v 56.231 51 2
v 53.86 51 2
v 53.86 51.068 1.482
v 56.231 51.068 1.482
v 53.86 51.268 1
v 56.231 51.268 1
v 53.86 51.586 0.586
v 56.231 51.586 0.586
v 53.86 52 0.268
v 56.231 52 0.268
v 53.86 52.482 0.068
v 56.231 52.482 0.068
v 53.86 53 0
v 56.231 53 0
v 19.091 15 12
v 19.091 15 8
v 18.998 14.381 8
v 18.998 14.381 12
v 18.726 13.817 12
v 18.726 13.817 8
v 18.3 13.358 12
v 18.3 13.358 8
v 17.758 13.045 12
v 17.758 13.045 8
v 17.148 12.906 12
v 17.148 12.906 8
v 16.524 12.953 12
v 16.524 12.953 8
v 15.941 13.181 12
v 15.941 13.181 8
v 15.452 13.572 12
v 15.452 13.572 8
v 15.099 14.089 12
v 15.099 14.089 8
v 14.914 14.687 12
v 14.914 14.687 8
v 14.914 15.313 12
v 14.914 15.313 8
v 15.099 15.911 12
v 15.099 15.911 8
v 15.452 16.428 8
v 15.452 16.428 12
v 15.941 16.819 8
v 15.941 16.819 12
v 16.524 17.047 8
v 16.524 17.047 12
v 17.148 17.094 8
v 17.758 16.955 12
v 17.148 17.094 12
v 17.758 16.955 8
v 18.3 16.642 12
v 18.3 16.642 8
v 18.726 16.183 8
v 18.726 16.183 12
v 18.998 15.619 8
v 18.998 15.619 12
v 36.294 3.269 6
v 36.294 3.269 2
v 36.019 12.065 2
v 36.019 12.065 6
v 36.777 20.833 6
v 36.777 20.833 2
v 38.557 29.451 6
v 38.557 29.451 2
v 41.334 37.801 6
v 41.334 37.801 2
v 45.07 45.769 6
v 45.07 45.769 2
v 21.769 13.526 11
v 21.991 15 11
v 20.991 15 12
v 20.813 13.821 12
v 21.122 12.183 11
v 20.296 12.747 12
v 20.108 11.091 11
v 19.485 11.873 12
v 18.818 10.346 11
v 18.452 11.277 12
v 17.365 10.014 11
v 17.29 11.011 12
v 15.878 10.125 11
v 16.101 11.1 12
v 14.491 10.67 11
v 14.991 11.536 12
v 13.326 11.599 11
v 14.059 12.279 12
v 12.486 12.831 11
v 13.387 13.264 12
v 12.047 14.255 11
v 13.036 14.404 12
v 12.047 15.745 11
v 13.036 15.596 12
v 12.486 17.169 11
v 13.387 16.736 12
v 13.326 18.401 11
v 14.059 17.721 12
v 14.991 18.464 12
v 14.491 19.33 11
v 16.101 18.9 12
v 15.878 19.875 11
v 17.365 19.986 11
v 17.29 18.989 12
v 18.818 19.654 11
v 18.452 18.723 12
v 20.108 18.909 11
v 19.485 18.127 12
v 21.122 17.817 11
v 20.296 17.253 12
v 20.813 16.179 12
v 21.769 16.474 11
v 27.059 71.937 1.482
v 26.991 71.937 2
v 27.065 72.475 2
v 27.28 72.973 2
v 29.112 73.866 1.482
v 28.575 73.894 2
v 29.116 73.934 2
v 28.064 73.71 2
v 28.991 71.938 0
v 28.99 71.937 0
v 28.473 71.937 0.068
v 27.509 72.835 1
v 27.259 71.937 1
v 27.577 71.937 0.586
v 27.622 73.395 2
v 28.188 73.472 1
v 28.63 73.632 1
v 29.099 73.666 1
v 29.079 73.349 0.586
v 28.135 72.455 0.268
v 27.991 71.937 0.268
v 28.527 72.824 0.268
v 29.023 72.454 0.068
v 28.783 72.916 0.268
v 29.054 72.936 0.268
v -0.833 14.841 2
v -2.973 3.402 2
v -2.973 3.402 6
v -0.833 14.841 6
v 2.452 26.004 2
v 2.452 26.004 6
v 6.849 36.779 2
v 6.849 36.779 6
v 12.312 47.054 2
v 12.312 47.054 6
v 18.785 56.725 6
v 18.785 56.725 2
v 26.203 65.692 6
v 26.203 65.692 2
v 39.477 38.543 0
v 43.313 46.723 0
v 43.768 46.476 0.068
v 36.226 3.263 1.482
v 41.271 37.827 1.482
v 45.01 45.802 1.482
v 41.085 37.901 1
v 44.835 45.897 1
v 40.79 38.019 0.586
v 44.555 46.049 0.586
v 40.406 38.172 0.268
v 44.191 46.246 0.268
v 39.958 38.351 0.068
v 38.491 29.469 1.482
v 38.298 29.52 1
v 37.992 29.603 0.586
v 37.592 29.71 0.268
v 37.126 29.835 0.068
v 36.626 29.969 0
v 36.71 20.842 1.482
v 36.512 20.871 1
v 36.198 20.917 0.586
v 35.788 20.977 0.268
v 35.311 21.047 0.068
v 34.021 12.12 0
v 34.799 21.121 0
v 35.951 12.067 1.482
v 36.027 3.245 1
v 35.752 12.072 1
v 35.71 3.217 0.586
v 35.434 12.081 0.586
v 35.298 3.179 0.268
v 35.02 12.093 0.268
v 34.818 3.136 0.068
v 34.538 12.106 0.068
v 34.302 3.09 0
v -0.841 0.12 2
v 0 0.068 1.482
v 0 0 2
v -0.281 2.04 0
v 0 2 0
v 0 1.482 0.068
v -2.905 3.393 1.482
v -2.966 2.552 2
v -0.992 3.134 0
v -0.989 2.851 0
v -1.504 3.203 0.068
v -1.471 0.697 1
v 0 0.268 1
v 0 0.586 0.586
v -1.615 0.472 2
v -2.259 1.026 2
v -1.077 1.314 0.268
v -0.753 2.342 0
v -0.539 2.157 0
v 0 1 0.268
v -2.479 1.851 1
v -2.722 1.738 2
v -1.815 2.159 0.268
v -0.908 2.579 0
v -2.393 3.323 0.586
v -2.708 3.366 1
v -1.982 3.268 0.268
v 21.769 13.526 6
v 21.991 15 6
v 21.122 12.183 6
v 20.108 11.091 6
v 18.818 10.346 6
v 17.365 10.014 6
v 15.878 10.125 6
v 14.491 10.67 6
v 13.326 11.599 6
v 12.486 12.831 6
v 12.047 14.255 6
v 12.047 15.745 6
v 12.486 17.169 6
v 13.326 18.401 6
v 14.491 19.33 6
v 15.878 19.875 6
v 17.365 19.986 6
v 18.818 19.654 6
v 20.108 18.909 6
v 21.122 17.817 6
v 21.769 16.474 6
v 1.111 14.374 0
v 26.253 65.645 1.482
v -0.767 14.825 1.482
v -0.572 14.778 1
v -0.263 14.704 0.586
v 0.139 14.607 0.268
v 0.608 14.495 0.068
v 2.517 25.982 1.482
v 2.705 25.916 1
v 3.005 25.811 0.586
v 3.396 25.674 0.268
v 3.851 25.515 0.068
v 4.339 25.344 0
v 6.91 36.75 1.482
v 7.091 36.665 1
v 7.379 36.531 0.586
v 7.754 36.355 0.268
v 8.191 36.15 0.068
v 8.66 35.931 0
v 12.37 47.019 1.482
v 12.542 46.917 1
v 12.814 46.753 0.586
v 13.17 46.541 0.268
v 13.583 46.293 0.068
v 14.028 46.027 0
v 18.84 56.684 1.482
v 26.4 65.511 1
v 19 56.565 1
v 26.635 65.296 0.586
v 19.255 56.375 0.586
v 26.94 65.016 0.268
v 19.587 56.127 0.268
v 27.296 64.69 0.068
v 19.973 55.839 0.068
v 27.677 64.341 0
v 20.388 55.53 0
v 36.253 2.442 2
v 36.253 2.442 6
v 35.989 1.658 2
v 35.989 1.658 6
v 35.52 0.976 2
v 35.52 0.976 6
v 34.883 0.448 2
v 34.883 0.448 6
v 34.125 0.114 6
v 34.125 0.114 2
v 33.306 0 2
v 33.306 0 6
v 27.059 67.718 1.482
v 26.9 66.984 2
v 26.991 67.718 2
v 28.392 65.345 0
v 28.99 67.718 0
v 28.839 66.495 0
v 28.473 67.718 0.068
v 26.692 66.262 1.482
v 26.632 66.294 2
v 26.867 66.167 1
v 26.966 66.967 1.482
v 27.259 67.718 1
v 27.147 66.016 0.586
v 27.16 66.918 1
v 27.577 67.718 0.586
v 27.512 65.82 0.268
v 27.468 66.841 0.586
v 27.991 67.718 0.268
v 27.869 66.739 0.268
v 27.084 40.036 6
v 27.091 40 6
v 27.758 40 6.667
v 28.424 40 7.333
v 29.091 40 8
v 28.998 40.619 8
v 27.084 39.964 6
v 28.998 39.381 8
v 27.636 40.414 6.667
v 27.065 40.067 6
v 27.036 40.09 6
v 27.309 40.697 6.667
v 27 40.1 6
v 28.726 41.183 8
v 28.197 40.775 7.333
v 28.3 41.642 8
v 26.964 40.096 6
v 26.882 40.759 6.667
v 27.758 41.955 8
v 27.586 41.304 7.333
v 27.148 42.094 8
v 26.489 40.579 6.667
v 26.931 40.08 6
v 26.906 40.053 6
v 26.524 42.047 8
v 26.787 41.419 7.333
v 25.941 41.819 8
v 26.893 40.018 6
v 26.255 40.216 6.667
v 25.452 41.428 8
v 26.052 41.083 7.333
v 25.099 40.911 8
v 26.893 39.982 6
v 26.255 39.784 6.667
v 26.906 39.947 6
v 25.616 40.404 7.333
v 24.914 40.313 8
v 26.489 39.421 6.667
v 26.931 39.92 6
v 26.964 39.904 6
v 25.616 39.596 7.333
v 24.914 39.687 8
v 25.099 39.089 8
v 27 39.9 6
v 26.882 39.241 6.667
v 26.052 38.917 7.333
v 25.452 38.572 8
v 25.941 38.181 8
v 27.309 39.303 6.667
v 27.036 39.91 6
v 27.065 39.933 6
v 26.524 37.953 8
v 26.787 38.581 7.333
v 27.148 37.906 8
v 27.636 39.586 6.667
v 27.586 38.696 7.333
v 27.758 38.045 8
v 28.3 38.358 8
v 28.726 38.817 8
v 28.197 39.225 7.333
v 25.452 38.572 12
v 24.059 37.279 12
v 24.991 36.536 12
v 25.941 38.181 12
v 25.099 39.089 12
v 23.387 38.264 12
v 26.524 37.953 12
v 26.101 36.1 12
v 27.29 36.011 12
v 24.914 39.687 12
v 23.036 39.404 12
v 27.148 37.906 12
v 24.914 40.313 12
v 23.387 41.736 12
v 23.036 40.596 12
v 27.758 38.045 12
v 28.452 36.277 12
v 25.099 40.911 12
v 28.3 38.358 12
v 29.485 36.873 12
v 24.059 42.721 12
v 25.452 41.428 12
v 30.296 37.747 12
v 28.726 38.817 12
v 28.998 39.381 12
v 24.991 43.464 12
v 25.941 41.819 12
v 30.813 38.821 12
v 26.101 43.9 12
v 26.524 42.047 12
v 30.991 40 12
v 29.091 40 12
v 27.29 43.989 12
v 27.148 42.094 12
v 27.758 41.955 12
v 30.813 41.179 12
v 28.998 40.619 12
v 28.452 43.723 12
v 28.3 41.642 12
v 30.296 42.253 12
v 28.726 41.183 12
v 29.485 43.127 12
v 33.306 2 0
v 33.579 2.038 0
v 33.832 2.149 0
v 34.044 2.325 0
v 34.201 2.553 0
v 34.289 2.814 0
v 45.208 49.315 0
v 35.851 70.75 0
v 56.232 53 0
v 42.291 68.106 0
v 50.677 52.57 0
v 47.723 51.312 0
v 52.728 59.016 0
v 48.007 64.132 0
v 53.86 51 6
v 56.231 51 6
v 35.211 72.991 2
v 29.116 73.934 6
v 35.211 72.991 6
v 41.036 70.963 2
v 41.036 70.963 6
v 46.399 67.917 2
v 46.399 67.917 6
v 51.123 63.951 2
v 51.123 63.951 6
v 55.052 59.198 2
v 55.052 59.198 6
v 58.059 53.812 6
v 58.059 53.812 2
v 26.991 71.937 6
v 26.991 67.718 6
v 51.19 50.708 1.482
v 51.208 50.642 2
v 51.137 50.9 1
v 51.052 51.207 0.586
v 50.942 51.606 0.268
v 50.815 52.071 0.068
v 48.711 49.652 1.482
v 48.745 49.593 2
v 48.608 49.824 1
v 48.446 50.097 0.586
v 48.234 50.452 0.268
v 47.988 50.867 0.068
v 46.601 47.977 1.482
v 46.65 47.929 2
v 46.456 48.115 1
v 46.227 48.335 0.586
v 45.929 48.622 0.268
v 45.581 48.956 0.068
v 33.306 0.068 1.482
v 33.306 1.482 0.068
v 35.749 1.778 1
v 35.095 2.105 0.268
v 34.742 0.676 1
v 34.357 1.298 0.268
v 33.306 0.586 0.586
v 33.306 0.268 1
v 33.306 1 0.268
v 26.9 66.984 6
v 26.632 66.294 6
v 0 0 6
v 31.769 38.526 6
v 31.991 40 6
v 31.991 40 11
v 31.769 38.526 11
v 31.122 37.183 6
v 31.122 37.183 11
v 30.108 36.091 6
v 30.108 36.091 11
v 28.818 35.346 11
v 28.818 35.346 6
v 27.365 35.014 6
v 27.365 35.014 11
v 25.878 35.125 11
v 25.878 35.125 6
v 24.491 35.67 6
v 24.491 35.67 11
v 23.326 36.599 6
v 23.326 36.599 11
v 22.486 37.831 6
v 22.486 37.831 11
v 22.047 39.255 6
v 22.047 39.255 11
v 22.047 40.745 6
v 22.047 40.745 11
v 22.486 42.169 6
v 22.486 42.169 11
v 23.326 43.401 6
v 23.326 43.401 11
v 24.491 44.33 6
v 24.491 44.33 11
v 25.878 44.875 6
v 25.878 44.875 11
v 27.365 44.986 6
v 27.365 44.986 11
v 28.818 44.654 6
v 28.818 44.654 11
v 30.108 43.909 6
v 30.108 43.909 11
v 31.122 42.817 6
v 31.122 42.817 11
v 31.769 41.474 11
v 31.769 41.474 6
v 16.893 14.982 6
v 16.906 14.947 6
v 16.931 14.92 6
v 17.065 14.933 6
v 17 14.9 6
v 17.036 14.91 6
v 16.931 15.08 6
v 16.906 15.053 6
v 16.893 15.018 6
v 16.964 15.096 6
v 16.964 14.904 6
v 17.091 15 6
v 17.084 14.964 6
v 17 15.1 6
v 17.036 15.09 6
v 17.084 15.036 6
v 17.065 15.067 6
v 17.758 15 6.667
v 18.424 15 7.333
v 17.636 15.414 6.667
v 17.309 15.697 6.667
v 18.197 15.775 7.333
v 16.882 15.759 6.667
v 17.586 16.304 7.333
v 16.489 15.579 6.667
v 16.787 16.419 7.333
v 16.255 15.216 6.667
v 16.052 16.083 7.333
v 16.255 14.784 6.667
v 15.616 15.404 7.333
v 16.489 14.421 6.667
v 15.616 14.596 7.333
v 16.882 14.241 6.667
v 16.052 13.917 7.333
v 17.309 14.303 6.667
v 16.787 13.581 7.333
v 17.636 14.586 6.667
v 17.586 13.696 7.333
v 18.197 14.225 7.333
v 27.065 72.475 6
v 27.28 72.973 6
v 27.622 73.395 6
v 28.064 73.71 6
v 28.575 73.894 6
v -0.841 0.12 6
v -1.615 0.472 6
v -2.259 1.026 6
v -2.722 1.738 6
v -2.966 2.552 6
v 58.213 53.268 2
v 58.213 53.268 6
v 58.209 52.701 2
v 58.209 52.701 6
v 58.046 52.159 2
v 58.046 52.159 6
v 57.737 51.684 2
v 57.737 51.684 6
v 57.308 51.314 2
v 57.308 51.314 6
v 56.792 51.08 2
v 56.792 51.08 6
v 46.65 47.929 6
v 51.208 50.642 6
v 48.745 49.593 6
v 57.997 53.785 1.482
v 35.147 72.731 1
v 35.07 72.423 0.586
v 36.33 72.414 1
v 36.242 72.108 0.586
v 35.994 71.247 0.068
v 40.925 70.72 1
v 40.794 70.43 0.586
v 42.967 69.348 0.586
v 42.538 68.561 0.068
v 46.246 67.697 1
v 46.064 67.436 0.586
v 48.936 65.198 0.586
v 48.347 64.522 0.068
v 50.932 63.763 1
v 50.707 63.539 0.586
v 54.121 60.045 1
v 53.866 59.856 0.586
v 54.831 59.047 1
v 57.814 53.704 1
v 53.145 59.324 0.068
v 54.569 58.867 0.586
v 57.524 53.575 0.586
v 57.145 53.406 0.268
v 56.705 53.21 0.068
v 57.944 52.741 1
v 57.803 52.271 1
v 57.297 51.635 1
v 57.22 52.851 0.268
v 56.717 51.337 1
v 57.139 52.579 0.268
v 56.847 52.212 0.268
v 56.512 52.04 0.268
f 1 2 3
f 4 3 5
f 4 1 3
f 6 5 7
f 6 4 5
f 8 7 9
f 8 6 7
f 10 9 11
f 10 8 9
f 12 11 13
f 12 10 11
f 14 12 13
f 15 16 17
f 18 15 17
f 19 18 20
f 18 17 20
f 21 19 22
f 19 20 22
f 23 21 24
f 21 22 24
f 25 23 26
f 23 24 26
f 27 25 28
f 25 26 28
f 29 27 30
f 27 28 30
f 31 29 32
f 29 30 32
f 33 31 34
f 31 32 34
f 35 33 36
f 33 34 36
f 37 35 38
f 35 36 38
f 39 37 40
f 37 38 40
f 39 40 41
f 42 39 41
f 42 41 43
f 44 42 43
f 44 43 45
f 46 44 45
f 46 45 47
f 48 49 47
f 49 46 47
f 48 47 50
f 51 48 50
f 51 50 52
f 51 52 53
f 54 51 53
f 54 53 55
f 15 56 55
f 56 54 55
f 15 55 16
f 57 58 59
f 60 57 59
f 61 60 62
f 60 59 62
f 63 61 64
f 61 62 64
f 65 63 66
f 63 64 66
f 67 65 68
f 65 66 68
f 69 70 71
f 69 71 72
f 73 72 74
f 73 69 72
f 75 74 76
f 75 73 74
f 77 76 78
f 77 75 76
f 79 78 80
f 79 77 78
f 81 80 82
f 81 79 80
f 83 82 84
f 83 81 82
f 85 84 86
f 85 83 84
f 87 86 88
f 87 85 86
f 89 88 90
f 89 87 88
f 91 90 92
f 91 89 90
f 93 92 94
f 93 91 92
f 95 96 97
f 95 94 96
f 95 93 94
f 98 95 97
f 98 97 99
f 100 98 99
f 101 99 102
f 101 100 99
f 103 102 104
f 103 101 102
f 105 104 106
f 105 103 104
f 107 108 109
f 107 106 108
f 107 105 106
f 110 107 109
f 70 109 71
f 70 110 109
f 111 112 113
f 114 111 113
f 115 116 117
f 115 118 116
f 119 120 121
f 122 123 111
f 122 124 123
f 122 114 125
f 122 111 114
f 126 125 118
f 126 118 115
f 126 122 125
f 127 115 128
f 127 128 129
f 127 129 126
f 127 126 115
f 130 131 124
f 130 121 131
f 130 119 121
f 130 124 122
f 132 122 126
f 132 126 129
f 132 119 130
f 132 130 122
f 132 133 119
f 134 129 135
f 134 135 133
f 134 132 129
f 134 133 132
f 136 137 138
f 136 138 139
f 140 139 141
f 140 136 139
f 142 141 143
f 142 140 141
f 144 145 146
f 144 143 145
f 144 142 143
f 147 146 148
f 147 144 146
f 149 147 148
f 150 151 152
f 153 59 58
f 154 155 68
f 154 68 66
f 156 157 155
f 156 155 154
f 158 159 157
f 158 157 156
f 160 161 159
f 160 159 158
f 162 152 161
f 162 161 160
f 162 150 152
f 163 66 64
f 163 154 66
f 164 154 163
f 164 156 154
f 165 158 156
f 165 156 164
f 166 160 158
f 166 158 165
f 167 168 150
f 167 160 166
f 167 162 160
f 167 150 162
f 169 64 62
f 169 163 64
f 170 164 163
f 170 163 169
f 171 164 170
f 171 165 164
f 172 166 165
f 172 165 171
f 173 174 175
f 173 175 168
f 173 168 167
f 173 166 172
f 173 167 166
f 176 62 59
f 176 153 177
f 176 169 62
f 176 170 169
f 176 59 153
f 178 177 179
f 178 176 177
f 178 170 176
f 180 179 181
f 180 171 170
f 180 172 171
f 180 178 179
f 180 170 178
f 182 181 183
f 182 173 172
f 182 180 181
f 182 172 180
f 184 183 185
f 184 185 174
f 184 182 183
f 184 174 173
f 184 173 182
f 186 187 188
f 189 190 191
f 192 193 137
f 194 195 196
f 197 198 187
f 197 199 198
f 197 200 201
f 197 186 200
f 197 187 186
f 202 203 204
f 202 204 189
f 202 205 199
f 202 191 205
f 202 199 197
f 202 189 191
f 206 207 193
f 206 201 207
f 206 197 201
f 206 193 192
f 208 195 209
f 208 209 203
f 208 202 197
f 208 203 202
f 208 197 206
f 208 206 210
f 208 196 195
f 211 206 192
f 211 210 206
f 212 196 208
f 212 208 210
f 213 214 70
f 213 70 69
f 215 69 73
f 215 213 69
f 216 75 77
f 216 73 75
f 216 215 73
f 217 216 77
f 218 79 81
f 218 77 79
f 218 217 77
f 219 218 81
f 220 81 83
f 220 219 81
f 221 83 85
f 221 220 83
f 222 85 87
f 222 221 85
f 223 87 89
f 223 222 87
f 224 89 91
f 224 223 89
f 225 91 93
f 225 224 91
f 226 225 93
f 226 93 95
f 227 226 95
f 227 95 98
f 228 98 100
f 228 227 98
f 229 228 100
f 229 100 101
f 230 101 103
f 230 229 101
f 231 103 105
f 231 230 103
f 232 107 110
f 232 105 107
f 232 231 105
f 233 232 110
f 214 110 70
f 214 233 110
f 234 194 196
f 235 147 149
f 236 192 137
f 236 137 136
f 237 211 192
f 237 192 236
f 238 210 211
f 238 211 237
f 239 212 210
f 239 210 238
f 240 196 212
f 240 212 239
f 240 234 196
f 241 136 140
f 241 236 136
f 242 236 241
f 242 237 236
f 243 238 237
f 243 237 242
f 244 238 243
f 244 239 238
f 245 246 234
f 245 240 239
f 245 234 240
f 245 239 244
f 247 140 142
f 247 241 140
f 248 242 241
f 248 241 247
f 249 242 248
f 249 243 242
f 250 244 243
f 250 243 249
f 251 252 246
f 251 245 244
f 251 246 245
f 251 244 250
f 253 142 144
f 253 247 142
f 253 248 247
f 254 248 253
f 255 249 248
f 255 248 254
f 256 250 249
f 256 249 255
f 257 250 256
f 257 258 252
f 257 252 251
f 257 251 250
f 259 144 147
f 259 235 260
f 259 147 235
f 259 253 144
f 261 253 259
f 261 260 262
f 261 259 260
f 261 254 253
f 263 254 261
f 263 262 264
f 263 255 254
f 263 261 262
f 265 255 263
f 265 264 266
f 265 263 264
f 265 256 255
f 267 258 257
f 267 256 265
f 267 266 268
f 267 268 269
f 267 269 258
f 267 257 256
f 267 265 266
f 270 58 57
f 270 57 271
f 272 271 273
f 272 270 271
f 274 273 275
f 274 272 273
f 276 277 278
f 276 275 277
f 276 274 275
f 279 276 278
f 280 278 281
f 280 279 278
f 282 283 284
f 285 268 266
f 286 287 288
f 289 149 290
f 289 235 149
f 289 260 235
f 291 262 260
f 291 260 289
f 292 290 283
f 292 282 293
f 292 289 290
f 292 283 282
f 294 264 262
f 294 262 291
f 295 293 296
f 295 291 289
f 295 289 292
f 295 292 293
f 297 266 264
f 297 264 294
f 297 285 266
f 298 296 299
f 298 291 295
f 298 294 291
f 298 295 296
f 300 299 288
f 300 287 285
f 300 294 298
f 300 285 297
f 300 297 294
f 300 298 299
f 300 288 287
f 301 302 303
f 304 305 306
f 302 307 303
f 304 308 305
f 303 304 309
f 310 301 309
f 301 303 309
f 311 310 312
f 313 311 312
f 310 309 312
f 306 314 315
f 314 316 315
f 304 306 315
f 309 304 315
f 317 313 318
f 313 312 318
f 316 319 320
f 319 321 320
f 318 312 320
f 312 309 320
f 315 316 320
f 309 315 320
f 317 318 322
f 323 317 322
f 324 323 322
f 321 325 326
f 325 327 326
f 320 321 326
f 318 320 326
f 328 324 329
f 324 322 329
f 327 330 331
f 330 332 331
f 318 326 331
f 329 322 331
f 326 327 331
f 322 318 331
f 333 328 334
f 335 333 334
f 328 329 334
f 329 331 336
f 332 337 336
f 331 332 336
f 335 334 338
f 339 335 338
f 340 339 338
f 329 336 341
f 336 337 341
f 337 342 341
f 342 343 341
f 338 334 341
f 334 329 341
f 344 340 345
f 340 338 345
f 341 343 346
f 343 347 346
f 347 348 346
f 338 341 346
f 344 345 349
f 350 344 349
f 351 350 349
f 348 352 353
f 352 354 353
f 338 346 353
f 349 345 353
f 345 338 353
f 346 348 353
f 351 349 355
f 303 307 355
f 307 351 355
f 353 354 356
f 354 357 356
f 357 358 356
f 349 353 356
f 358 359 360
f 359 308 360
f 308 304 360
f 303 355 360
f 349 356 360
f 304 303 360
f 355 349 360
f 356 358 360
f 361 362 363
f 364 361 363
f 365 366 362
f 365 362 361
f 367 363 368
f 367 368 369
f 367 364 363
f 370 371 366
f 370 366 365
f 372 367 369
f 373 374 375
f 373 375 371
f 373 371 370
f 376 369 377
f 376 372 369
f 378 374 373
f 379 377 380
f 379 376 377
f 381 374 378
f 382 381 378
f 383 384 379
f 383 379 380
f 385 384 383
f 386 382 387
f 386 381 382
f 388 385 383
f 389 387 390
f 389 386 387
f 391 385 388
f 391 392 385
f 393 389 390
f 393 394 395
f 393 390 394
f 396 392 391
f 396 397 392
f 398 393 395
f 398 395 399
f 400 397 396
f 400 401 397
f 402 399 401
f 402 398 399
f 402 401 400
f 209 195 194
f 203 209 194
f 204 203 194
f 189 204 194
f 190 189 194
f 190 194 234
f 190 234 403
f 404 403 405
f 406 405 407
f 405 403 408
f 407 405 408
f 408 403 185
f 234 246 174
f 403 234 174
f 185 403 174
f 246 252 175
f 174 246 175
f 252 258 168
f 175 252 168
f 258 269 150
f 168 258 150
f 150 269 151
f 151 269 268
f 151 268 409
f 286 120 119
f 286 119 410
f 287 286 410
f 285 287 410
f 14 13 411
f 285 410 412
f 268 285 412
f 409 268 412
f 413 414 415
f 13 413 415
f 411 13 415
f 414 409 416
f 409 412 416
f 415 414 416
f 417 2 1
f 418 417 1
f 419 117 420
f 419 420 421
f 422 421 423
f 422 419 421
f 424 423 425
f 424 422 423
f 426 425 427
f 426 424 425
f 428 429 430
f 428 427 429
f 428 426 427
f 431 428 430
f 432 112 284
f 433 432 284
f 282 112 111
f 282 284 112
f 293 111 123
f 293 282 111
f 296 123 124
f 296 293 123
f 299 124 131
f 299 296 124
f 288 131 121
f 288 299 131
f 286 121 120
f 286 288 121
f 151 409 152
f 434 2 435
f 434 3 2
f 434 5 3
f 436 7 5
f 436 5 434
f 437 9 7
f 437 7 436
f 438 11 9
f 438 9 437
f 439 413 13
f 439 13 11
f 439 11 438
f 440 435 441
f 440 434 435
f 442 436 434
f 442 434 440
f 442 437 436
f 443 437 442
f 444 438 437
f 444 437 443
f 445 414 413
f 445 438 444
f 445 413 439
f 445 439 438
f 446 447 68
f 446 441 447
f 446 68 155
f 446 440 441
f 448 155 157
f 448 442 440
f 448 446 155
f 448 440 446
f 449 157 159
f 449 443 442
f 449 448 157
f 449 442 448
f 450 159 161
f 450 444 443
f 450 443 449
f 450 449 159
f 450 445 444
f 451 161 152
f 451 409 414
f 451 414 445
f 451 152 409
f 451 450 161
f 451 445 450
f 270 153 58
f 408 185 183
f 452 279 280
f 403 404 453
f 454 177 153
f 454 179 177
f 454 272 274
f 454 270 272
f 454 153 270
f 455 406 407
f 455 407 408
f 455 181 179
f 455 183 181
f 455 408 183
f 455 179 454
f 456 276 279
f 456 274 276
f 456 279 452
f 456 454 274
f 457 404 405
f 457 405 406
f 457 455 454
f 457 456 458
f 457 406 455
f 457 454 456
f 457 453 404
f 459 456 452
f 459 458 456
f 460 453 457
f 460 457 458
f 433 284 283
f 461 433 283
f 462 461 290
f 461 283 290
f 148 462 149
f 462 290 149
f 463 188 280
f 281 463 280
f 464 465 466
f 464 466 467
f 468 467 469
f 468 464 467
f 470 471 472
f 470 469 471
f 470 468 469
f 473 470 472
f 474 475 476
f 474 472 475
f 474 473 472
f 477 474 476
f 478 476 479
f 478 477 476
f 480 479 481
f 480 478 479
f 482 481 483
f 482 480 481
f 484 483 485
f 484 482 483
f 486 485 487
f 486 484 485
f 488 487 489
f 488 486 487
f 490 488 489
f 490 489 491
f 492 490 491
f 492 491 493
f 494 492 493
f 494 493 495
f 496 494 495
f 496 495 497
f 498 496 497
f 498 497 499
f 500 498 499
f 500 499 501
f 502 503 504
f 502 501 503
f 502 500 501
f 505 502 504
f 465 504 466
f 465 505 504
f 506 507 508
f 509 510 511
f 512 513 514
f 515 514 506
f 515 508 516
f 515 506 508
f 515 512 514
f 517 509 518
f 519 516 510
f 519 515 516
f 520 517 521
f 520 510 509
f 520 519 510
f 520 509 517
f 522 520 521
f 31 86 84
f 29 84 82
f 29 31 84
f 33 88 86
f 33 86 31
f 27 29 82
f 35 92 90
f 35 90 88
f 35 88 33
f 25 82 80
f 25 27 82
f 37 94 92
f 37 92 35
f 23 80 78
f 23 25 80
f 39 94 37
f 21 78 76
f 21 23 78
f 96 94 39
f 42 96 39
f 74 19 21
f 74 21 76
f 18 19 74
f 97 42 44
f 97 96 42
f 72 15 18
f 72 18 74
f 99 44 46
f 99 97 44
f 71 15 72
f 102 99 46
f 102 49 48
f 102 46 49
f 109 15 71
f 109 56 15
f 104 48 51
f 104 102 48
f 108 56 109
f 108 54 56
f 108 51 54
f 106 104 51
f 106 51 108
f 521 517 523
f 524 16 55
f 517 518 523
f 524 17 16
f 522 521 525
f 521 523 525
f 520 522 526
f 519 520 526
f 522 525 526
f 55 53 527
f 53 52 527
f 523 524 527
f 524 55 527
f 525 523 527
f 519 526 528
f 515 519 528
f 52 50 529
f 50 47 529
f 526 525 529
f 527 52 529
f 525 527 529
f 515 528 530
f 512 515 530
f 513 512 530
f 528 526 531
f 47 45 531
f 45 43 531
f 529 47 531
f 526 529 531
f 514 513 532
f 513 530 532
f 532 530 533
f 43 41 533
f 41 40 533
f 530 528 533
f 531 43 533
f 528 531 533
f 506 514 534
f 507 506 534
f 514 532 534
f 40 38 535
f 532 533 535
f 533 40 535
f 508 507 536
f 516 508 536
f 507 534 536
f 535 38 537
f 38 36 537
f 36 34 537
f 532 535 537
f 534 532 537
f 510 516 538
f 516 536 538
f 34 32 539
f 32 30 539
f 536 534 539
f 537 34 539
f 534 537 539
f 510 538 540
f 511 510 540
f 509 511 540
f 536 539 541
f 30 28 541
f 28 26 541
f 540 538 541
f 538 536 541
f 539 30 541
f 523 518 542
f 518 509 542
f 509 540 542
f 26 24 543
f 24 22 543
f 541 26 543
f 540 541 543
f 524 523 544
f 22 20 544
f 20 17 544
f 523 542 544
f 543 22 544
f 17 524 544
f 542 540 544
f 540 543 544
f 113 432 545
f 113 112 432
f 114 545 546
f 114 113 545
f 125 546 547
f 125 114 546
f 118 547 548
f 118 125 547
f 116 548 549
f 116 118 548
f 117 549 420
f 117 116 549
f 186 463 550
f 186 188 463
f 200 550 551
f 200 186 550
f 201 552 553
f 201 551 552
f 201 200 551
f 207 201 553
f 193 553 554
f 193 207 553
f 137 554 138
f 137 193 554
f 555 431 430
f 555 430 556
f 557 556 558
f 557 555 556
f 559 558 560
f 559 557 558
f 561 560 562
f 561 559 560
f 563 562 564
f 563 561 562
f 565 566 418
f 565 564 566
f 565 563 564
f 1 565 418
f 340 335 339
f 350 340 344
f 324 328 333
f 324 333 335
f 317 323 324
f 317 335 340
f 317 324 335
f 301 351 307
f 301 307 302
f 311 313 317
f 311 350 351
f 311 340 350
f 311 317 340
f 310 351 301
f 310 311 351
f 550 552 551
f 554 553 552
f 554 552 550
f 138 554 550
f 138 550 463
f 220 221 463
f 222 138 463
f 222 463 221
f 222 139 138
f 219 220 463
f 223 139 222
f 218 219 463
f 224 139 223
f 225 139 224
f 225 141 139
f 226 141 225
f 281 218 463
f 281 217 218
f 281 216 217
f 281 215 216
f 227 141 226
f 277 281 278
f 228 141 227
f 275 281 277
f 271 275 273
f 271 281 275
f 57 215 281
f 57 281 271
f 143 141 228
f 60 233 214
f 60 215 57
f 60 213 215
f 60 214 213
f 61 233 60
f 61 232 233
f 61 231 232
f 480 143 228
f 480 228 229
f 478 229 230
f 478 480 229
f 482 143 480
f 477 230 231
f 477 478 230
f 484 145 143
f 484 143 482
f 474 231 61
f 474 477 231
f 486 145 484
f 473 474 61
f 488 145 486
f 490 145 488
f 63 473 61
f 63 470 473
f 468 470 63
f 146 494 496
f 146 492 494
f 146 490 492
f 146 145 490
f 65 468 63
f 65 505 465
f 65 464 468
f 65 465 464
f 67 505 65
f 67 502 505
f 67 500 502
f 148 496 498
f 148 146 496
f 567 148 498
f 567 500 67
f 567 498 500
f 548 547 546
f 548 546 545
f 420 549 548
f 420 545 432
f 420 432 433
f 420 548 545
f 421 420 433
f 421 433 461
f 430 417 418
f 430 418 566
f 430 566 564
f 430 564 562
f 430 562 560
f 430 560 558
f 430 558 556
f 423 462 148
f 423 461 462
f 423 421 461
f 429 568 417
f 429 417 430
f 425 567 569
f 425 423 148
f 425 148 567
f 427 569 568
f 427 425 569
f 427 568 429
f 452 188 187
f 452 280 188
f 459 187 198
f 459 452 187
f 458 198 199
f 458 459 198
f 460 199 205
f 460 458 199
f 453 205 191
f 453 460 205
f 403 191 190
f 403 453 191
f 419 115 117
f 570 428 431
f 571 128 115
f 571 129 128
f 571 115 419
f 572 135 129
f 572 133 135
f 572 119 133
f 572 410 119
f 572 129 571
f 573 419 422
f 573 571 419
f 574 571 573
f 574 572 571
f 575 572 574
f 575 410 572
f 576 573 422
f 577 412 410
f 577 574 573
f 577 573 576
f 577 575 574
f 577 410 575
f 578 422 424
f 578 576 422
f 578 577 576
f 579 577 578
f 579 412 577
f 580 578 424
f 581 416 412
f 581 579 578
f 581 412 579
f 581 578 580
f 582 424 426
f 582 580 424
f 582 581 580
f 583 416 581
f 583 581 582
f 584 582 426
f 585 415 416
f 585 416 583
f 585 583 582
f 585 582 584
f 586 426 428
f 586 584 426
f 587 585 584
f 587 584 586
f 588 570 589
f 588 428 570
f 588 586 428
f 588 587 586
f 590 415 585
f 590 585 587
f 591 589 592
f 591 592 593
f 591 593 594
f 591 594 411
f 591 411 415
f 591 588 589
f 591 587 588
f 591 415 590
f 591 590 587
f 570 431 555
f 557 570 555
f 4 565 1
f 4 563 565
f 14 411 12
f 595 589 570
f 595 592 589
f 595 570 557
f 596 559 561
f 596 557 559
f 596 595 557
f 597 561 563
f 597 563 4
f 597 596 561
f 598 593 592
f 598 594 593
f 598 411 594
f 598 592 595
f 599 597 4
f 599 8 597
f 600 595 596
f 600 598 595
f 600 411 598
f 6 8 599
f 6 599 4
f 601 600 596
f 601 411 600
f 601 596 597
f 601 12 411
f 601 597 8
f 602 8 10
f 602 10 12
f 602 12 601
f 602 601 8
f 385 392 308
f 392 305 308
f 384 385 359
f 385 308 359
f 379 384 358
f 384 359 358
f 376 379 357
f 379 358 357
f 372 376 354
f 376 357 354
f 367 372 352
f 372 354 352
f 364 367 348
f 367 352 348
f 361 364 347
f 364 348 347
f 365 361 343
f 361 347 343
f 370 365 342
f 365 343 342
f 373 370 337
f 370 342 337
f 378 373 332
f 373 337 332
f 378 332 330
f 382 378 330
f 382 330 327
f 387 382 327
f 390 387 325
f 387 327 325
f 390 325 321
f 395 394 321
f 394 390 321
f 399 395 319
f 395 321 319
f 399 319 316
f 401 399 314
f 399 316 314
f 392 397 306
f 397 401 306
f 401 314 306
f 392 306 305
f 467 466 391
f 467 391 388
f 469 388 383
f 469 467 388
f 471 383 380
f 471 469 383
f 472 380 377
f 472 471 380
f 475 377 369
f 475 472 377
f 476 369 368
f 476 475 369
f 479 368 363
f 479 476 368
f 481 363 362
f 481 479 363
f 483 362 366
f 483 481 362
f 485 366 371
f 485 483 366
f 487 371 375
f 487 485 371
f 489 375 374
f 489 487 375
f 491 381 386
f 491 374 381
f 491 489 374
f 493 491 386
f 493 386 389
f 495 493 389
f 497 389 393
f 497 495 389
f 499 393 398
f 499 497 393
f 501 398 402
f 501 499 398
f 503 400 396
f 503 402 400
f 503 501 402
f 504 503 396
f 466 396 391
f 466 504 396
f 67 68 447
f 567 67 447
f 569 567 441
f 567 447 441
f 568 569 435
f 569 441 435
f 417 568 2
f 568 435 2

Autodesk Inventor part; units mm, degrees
ref_plane "YZ Plane" through (0, 0, 0) normal (1, 0, 0) x (0, 1, 0)
ref_plane "XZ Plane" through (0, 0, 0) normal (0, 1, 0) x (-1, 0, 0)
ref_plane "XY Plane" through (0, 0, 0) normal (0, 0, 1) x (1, 0, 0)
sketch "Sketch1" plane through (0, 0, 0) normal (0, 0, 1) x (1, 0, 0)
  arc A0 (26.2029, 65.6915) -> (-2.973, 3.4018) centre (110.991, -12) ccw
  line L0 (26.991, 71.9374) -> (26.991, 67.7183)
  arc A1 (26.2029, 65.6915) -> (26.991, 67.7183) centre (23.991, 67.7183) ccw
  arc A2 (29.116, 73.9335) -> (26.991, 71.9374) centre (28.991, 71.9374) ccw
  arc A3 (58.0589, 53.8125) -> (29.116, 73.9335) centre (26.991, 40) ccw
  arc A4 (56.2314, 51) -> (58.0589, 53.8125) centre (56.2314, 53) ccw
  line L1 (53.8596, 51) -> (56.2314, 51)
  arc A5 (53.8596, 51) -> (45.0701, 45.7692) centre (53.8596, 41) ccw
  arc A6 (45.0701, 45.7692) -> (36.2936, 3.2692) centre (110.991, 10) ccw
  arc A7 (33.3057, 0) -> (36.2936, 3.2692) centre (33.3057, 3) ccw
  line L2 (0, 0) -> (33.3057, 0)
  arc A8 (-2.973, 3.4018) -> (0, 0) centre (0, 3) ccw
extrude "Extrusion1" add sketch "Sketch1" along normal blind 6
fillet "Fillet1" radius 2 12 edges at (57.9084, 51.9103, 0) (46.3986, 67.9167, 0) (27.6217, 73.3952, 0) (26.991, 69.8278, 0) (26.787, 66.631, 0) (6.8488, 36.7791, 0) (-2.2589, 1.0258, 0) (16.6529, 0, 0) (35.5202, 0.9761, 0) (37.5408, 25.1679, 0) (48.7455, 49.5934, 0) (55.0455, 51, 0)
sketch "Sketch2" plane through (0, 0, 6) normal (0, 0, 1) x (1, 0, 0)
  circle A0 centre (16.991, 15) radius 5
  circle A1 centre (26.991, 40) radius 5
  circle A2 centre (16.991, 15) radius 2.1
  circle A3 centre (26.991, 40) radius 2.1
  point P0 (0, 0)
extrude "Extrusion2" add sketch "Sketch2" along normal blind 6
chamfer "Chamfer1" distance 1 angle 45 2 edges at (21.991, 40, 12) (11.991, 15, 12)
chamfer "Chamfer2" distance 2 angle 45 1 edges at (24.891, 40, 6)
chamfer "Chamfer3" distance 2 angle 45 1 edges at (14.891, 15, 6)
properties part number "Rukohvat_Levi_2"
